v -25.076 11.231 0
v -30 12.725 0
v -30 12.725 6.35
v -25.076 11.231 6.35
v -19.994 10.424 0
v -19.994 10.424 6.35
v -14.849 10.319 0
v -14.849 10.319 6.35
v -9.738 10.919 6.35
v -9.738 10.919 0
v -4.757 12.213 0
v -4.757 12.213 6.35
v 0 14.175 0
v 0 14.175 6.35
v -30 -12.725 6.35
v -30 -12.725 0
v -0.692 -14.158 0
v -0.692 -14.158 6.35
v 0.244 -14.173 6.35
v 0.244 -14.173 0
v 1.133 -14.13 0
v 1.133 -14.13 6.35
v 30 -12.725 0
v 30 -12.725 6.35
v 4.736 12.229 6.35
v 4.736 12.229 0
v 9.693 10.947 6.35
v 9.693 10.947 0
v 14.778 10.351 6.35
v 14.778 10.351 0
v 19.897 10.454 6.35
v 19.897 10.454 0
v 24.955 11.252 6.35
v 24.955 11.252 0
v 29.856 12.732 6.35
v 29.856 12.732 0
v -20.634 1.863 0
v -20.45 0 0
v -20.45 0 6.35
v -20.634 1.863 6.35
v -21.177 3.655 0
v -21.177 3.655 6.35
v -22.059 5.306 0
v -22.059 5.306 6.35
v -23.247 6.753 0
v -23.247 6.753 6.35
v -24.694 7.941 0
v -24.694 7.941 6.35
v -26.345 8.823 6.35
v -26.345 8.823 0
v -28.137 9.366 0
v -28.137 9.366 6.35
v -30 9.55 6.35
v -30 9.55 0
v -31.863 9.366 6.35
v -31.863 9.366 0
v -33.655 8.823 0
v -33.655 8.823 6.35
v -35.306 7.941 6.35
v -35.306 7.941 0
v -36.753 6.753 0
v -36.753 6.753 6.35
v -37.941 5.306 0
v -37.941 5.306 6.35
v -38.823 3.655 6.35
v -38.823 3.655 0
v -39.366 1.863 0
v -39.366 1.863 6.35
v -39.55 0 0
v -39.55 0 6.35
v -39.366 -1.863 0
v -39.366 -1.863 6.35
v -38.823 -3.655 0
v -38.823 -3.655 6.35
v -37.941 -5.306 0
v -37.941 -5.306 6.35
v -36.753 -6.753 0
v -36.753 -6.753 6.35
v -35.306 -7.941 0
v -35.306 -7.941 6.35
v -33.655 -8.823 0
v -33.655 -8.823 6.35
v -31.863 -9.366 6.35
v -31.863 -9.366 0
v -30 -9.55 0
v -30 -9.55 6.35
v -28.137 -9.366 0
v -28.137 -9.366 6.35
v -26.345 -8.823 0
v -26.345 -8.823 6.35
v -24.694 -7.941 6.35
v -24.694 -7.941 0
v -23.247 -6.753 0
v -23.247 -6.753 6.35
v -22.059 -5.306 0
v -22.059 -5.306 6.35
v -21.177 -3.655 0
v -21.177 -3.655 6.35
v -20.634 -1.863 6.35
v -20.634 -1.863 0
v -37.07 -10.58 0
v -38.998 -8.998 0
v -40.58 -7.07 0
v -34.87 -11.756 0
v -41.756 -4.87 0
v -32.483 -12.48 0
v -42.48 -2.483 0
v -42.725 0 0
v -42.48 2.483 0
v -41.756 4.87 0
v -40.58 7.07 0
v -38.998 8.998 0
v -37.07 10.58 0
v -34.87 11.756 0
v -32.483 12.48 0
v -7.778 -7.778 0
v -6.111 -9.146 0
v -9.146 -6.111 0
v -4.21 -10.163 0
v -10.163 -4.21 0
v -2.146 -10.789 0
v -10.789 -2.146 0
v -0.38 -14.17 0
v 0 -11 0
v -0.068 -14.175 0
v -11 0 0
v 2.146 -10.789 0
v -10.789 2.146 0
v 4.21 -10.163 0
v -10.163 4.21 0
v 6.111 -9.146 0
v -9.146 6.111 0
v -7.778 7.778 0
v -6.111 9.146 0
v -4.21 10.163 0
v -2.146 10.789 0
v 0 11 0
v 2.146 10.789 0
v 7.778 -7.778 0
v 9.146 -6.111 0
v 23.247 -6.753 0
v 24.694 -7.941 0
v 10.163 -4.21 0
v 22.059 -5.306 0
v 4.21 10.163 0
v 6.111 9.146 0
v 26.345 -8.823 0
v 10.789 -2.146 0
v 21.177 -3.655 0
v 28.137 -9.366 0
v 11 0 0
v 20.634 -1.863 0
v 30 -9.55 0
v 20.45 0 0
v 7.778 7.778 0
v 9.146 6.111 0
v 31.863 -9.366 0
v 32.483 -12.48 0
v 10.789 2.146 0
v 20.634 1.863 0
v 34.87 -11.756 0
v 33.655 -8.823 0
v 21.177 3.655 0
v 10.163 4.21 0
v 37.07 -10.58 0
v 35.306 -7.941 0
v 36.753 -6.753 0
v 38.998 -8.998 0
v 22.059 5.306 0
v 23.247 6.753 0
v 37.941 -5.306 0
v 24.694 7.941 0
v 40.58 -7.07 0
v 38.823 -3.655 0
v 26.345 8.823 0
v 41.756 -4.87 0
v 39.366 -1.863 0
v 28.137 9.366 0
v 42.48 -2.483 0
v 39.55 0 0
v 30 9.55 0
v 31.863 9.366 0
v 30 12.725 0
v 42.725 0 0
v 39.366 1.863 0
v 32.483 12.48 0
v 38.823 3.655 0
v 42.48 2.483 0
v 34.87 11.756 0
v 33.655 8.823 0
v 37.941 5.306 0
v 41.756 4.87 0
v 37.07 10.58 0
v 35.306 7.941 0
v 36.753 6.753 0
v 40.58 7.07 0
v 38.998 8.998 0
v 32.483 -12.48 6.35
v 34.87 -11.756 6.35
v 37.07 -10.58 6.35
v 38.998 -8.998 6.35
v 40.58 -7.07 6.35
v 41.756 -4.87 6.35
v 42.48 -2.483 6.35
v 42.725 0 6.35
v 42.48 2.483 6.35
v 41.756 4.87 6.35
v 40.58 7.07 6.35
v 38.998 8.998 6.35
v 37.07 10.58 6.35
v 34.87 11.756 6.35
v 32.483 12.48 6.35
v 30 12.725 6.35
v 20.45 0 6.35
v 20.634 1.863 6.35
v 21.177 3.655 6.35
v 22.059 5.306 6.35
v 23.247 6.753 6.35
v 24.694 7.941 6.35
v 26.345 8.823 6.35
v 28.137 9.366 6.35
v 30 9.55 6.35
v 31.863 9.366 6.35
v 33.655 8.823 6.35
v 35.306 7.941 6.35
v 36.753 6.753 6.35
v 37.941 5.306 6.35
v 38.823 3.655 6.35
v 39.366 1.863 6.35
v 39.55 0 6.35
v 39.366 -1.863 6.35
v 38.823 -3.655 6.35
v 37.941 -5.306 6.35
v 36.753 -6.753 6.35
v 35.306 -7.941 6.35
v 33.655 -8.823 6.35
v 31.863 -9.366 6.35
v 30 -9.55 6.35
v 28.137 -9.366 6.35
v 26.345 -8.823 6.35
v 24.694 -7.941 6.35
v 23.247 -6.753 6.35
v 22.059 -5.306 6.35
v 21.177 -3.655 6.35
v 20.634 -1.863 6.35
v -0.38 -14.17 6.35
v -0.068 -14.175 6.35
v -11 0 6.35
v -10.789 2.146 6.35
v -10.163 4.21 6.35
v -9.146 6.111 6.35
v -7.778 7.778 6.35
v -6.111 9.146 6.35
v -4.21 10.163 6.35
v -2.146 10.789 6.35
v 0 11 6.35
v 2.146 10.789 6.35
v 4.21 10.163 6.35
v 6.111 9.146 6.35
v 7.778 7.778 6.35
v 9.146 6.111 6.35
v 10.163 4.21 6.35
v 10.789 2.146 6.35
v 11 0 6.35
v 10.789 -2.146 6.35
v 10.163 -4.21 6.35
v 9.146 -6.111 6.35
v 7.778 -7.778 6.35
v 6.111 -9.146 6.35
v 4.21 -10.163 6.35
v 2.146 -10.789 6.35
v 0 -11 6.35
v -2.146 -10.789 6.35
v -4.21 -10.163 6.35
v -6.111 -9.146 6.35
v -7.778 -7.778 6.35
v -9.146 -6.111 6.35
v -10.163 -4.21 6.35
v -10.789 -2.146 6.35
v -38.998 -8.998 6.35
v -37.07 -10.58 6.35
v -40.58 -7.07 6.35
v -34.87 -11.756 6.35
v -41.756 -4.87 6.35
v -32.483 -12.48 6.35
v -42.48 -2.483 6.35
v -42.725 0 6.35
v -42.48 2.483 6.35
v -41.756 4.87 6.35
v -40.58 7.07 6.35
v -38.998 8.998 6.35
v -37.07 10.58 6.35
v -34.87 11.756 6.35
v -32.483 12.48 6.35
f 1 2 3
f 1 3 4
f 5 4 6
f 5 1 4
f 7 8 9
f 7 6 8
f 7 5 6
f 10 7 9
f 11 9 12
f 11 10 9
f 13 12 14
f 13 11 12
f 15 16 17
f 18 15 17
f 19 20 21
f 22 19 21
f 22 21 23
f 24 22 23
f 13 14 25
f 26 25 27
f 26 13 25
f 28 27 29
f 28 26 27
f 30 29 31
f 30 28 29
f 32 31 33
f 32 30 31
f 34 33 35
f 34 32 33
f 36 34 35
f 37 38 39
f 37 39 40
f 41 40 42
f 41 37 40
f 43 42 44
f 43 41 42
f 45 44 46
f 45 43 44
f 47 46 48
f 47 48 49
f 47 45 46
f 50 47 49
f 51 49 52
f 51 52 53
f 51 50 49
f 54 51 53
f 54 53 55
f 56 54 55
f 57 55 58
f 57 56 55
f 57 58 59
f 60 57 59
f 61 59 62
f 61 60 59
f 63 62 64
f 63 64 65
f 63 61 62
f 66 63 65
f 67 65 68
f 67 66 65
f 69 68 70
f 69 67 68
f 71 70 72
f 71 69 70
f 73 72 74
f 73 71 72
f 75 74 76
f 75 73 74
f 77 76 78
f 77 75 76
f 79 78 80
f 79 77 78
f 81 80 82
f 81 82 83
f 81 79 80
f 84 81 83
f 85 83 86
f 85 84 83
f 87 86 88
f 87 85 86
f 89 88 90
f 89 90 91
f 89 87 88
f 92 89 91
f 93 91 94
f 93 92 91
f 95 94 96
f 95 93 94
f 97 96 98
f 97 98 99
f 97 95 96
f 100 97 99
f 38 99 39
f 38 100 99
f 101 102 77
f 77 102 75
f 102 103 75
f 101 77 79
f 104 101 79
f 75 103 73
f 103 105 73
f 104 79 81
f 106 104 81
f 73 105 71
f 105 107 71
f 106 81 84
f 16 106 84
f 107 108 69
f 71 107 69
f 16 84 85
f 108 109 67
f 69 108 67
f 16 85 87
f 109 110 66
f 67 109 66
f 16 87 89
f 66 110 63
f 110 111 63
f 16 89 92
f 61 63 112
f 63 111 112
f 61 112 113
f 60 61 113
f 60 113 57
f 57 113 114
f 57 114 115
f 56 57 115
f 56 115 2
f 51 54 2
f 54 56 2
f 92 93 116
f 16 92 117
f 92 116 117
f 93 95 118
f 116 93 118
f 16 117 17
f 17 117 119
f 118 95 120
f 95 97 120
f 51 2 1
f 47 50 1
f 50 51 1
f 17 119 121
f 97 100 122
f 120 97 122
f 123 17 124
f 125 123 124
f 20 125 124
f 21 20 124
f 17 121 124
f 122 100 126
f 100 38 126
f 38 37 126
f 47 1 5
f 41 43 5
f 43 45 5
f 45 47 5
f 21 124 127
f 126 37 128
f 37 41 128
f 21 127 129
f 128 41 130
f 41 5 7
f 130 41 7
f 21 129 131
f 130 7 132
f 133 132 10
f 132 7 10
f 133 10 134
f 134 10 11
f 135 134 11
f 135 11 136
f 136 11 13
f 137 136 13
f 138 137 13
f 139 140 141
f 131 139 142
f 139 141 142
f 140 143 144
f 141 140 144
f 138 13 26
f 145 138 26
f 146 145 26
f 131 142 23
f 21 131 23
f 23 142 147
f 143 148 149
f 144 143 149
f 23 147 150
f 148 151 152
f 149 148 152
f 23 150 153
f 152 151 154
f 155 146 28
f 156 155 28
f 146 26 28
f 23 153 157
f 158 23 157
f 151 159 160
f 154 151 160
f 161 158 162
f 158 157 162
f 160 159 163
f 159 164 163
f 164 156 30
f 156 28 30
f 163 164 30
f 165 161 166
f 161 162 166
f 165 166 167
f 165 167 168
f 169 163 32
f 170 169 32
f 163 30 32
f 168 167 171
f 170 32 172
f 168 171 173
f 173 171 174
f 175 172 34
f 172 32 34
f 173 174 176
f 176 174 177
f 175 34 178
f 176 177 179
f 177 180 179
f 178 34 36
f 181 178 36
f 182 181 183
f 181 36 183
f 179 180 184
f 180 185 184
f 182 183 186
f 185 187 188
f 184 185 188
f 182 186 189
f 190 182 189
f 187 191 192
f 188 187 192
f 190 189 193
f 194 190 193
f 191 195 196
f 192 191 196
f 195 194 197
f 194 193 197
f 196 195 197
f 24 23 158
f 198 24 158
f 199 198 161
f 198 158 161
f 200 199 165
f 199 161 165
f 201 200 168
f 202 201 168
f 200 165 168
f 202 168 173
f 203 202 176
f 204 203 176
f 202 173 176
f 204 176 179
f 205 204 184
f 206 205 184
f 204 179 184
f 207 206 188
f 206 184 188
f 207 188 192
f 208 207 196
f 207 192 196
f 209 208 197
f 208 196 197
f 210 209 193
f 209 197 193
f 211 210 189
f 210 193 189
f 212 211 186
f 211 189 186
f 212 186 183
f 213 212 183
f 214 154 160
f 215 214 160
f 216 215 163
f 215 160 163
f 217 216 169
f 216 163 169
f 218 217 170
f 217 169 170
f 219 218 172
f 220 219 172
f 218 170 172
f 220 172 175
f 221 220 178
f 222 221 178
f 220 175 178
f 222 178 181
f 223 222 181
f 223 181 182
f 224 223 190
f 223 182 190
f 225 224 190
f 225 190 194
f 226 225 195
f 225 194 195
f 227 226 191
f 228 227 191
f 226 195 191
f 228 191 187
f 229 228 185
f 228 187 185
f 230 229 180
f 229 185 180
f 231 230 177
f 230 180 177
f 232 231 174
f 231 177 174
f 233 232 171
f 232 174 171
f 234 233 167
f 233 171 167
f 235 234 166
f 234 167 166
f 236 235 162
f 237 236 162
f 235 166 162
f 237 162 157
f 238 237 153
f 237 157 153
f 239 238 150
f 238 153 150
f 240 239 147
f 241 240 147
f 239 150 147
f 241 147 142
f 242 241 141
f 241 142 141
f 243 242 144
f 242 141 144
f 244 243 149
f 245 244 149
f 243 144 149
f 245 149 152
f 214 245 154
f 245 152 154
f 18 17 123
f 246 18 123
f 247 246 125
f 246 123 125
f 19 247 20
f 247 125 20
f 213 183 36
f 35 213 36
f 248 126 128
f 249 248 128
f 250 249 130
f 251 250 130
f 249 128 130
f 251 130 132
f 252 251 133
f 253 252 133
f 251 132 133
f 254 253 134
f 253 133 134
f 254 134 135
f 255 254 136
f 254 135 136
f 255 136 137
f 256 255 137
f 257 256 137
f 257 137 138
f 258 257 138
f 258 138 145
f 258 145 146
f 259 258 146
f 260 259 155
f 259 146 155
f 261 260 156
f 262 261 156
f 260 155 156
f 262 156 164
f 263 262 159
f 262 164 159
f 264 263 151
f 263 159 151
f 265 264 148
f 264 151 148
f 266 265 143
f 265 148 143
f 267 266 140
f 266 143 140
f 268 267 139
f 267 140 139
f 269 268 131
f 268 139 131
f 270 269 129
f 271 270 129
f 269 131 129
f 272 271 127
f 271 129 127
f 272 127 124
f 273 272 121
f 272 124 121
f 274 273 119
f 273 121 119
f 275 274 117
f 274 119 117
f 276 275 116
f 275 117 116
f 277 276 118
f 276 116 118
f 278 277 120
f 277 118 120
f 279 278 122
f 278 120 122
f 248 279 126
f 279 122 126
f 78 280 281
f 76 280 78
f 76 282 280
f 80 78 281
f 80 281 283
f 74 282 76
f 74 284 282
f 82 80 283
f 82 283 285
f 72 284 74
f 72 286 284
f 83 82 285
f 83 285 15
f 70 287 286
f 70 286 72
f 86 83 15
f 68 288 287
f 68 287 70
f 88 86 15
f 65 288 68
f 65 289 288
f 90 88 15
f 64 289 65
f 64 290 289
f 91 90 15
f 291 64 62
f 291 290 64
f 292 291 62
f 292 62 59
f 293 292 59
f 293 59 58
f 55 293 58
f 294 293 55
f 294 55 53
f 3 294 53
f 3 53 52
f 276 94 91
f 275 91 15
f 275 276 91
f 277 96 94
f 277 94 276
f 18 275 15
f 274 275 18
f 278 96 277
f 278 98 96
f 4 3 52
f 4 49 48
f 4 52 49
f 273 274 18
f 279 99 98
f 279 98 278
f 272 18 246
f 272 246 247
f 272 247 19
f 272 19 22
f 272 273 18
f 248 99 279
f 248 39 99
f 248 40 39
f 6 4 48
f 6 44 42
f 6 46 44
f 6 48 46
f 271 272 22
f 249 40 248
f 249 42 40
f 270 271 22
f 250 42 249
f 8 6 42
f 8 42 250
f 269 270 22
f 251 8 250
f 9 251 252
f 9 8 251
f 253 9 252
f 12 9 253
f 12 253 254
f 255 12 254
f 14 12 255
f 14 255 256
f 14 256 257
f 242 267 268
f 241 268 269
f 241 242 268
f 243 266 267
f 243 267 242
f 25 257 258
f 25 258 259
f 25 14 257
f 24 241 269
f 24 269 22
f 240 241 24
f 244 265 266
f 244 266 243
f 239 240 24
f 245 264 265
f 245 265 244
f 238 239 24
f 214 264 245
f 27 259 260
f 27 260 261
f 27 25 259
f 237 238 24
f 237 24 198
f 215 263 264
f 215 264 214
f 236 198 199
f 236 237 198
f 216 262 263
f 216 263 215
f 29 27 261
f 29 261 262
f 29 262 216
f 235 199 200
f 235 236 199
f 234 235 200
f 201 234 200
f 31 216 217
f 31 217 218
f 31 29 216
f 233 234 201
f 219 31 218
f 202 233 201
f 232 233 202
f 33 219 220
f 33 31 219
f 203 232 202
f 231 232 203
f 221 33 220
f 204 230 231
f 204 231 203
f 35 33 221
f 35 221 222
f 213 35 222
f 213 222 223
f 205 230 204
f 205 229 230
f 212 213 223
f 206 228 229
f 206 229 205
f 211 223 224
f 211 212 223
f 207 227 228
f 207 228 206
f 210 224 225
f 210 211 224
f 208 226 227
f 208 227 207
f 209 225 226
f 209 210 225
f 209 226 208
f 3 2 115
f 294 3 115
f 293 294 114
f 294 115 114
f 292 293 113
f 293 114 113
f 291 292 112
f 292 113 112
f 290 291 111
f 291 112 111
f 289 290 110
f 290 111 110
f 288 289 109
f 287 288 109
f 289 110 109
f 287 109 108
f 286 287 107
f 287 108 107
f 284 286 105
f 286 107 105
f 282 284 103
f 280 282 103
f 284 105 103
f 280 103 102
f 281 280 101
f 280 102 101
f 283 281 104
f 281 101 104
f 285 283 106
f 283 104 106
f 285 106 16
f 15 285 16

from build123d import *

# Parameters (mm, degrees)
F0_R     = 9.55
F1_DEPTH = 6.35
F3_DEPTH = 25


# Not quite as in the source:
# - a feature names something its author has since deleted; it is built from what else it names


with BuildPart() as f1:
    # F0 (on Top) → F1 (new body)
    with BuildSketch(Plane.XY):
        with BuildLine():
            Line((14.175, 0), (11, 0))
            ThreePointArc((11, 0), (0, -11), (-11, 0))
            Line((-11, 0), (-14.175, 0))
            ThreePointArc((-14.175, 0), (-10.265086005, -9.7754096748), (-0.6923002736, -14.1580840982))
            ThreePointArc((-0.6923002736, -14.1580840982), (-0.2241695179, -14.1732273328), (0.2442059858, -14.1728962614))
            Line((0.2442059858, -14.1728962614), (1.1329762166, -14.1296493195))
            ThreePointArc((1.1329762166, -14.1296493195), (10.4161068272, -9.6143301152), (14.175, 0))
        make_face()
        with BuildLine():
            ThreePointArc((-11, 0), (0, 11), (11, 0))
            Line((11, 0), (14.175, 0))
            ThreePointArc((14.175, 0), (10.4954430476, 9.5276597459), (1.3670564043, 14.1089256071))
            Line((1.3670564043, 14.1089256071), (0, 14.175))
            Line((0, 14.175), (-1.3670564043, 14.1089256071))
            ThreePointArc((-1.3670564043, 14.1089256071), (-10.4954430476, 9.5276597459), (-14.175, 0))
            Line((-14.175, 0), (-11, 0))
        make_face()
        with BuildLine():
            Line((17.275, 0), (14.175, 0))
            ThreePointArc((14.175, 0), (10.4161068272, -9.6143301152), (1.1329762166, -14.1296493195))
            Line((1.1329762166, -14.1296493195), (30, -12.725))
            ThreePointArc((30, -12.725), (21.0020662094, -8.9979337906), (17.275, 0))
        make_face()
        with BuildLine():
            ThreePointArc((1.3670564043, 14.1089256071), (10.4954430476, 9.5276597459), (14.175, 0))
            Line((14.175, 0), (17.275, 0))
            ThreePointArc((17.275, 0), (21.0020662094, 8.9979337906), (30, 12.725))
            Line((30, 12.725), (1.3670564043, 14.1089256071))
        make_face()
        with BuildLine():
            Line((-17.275, 0), (-14.175, 0))
            ThreePointArc((-14.175, 0), (-10.4954430476, 9.5276597459), (-1.3670564043, 14.1089256071))
            Line((-1.3670564043, 14.1089256071), (-30, 12.725))
            ThreePointArc((-30, 12.725), (-21.0020662094, 8.9979337906), (-17.275, 0))
        make_face()
        with BuildLine():
            ThreePointArc((-0.6923002736, -14.1580840982), (-10.265086005, -9.7754096748), (-14.175, 0))
            Line((-14.175, 0), (-17.275, 0))
            ThreePointArc((-17.275, 0), (-21.0020662094, -8.9979337906), (-30, -12.725))
            Line((-30, -12.725), (-0.6923002736, -14.1580840982))
        make_face()
        with BuildLine():
            ThreePointArc((30, 12.725), (21.0020662094, 8.9979337906), (17.275, 0))
            ThreePointArc((17.275, 0), (21.0020662094, -8.9979337906), (30, -12.725))
            ThreePointArc((30, -12.725), (38.9979337906, -8.9979337906), (42.725, 0))
            ThreePointArc((42.725, 0), (38.9979337906, 8.9979337906), (30, 12.725))
        make_face()
        with BuildLine():
            ThreePointArc((39.55, 0), (30, -9.55), (20.45, 0))
            ThreePointArc((20.45, 0), (30, 9.55), (39.55, 0))
        make_face(mode=Mode.SUBTRACT)
        with BuildLine():
            ThreePointArc((-30, -12.725), (-21.0020662094, -8.9979337906), (-17.275, 0))
            ThreePointArc((-17.275, 0), (-21.0020662094, 8.9979337906), (-30, 12.725))
            ThreePointArc((-30, 12.725), (-42.725, 0), (-30, -12.725))
        make_face()
        with Locations((-30, 0)):
            Circle(F0_R, mode=Mode.SUBTRACT)
    extrude(amount=F1_DEPTH)

    # F2 (on Top) → F3 (cut)
    with BuildSketch(Plane.XY):
        with BuildLine():
            ThreePointArc((-0.0002806461, 14.1748610267), (-20.9243917712, 47.820811609), (-0.0002806461, 81.4667621913))
            ThreePointArc((-0.0002806461, 81.4667621913), (-54.2064032082, 47.820811609), (-0.0002806461, 14.1748610267))
        make_face()
        with BuildLine():
            ThreePointArc((-0.0002806461, 14.1748610267), (15.2384059917, 28.0205677125), (20.8838914193, 47.820811609))
            ThreePointArc((20.8838914193, 47.820811609), (15.2384059917, 67.6210555055), (-0.0002806461, 81.4667621913))
            ThreePointArc((-0.0002806461, 81.4667621913), (-20.9243917712, 47.820811609), (-0.0002806461, 14.1748610267))
        make_face()
        with BuildLine():
            ThreePointArc((-0.0002806461, 81.4667621913), (15.2384059917, 67.6210555055), (20.8838914193, 47.820811609))
            ThreePointArc((20.8838914193, 47.820811609), (15.2384059917, 28.0205677125), (-0.0002806461, 14.1748610267))
            ThreePointArc((-0.0002806461, 14.1748610267), (36.3997744183, 15.9650923463), (54.1023755584, 47.820811609))
            ThreePointArc((54.1023755584, 47.820811609), (36.3997744183, 79.6765308717), (-0.0002806461, 81.4667621913))
        make_face()
    extrude(amount=F3_DEPTH, mode=Mode.SUBTRACT)


solid = f1.part
